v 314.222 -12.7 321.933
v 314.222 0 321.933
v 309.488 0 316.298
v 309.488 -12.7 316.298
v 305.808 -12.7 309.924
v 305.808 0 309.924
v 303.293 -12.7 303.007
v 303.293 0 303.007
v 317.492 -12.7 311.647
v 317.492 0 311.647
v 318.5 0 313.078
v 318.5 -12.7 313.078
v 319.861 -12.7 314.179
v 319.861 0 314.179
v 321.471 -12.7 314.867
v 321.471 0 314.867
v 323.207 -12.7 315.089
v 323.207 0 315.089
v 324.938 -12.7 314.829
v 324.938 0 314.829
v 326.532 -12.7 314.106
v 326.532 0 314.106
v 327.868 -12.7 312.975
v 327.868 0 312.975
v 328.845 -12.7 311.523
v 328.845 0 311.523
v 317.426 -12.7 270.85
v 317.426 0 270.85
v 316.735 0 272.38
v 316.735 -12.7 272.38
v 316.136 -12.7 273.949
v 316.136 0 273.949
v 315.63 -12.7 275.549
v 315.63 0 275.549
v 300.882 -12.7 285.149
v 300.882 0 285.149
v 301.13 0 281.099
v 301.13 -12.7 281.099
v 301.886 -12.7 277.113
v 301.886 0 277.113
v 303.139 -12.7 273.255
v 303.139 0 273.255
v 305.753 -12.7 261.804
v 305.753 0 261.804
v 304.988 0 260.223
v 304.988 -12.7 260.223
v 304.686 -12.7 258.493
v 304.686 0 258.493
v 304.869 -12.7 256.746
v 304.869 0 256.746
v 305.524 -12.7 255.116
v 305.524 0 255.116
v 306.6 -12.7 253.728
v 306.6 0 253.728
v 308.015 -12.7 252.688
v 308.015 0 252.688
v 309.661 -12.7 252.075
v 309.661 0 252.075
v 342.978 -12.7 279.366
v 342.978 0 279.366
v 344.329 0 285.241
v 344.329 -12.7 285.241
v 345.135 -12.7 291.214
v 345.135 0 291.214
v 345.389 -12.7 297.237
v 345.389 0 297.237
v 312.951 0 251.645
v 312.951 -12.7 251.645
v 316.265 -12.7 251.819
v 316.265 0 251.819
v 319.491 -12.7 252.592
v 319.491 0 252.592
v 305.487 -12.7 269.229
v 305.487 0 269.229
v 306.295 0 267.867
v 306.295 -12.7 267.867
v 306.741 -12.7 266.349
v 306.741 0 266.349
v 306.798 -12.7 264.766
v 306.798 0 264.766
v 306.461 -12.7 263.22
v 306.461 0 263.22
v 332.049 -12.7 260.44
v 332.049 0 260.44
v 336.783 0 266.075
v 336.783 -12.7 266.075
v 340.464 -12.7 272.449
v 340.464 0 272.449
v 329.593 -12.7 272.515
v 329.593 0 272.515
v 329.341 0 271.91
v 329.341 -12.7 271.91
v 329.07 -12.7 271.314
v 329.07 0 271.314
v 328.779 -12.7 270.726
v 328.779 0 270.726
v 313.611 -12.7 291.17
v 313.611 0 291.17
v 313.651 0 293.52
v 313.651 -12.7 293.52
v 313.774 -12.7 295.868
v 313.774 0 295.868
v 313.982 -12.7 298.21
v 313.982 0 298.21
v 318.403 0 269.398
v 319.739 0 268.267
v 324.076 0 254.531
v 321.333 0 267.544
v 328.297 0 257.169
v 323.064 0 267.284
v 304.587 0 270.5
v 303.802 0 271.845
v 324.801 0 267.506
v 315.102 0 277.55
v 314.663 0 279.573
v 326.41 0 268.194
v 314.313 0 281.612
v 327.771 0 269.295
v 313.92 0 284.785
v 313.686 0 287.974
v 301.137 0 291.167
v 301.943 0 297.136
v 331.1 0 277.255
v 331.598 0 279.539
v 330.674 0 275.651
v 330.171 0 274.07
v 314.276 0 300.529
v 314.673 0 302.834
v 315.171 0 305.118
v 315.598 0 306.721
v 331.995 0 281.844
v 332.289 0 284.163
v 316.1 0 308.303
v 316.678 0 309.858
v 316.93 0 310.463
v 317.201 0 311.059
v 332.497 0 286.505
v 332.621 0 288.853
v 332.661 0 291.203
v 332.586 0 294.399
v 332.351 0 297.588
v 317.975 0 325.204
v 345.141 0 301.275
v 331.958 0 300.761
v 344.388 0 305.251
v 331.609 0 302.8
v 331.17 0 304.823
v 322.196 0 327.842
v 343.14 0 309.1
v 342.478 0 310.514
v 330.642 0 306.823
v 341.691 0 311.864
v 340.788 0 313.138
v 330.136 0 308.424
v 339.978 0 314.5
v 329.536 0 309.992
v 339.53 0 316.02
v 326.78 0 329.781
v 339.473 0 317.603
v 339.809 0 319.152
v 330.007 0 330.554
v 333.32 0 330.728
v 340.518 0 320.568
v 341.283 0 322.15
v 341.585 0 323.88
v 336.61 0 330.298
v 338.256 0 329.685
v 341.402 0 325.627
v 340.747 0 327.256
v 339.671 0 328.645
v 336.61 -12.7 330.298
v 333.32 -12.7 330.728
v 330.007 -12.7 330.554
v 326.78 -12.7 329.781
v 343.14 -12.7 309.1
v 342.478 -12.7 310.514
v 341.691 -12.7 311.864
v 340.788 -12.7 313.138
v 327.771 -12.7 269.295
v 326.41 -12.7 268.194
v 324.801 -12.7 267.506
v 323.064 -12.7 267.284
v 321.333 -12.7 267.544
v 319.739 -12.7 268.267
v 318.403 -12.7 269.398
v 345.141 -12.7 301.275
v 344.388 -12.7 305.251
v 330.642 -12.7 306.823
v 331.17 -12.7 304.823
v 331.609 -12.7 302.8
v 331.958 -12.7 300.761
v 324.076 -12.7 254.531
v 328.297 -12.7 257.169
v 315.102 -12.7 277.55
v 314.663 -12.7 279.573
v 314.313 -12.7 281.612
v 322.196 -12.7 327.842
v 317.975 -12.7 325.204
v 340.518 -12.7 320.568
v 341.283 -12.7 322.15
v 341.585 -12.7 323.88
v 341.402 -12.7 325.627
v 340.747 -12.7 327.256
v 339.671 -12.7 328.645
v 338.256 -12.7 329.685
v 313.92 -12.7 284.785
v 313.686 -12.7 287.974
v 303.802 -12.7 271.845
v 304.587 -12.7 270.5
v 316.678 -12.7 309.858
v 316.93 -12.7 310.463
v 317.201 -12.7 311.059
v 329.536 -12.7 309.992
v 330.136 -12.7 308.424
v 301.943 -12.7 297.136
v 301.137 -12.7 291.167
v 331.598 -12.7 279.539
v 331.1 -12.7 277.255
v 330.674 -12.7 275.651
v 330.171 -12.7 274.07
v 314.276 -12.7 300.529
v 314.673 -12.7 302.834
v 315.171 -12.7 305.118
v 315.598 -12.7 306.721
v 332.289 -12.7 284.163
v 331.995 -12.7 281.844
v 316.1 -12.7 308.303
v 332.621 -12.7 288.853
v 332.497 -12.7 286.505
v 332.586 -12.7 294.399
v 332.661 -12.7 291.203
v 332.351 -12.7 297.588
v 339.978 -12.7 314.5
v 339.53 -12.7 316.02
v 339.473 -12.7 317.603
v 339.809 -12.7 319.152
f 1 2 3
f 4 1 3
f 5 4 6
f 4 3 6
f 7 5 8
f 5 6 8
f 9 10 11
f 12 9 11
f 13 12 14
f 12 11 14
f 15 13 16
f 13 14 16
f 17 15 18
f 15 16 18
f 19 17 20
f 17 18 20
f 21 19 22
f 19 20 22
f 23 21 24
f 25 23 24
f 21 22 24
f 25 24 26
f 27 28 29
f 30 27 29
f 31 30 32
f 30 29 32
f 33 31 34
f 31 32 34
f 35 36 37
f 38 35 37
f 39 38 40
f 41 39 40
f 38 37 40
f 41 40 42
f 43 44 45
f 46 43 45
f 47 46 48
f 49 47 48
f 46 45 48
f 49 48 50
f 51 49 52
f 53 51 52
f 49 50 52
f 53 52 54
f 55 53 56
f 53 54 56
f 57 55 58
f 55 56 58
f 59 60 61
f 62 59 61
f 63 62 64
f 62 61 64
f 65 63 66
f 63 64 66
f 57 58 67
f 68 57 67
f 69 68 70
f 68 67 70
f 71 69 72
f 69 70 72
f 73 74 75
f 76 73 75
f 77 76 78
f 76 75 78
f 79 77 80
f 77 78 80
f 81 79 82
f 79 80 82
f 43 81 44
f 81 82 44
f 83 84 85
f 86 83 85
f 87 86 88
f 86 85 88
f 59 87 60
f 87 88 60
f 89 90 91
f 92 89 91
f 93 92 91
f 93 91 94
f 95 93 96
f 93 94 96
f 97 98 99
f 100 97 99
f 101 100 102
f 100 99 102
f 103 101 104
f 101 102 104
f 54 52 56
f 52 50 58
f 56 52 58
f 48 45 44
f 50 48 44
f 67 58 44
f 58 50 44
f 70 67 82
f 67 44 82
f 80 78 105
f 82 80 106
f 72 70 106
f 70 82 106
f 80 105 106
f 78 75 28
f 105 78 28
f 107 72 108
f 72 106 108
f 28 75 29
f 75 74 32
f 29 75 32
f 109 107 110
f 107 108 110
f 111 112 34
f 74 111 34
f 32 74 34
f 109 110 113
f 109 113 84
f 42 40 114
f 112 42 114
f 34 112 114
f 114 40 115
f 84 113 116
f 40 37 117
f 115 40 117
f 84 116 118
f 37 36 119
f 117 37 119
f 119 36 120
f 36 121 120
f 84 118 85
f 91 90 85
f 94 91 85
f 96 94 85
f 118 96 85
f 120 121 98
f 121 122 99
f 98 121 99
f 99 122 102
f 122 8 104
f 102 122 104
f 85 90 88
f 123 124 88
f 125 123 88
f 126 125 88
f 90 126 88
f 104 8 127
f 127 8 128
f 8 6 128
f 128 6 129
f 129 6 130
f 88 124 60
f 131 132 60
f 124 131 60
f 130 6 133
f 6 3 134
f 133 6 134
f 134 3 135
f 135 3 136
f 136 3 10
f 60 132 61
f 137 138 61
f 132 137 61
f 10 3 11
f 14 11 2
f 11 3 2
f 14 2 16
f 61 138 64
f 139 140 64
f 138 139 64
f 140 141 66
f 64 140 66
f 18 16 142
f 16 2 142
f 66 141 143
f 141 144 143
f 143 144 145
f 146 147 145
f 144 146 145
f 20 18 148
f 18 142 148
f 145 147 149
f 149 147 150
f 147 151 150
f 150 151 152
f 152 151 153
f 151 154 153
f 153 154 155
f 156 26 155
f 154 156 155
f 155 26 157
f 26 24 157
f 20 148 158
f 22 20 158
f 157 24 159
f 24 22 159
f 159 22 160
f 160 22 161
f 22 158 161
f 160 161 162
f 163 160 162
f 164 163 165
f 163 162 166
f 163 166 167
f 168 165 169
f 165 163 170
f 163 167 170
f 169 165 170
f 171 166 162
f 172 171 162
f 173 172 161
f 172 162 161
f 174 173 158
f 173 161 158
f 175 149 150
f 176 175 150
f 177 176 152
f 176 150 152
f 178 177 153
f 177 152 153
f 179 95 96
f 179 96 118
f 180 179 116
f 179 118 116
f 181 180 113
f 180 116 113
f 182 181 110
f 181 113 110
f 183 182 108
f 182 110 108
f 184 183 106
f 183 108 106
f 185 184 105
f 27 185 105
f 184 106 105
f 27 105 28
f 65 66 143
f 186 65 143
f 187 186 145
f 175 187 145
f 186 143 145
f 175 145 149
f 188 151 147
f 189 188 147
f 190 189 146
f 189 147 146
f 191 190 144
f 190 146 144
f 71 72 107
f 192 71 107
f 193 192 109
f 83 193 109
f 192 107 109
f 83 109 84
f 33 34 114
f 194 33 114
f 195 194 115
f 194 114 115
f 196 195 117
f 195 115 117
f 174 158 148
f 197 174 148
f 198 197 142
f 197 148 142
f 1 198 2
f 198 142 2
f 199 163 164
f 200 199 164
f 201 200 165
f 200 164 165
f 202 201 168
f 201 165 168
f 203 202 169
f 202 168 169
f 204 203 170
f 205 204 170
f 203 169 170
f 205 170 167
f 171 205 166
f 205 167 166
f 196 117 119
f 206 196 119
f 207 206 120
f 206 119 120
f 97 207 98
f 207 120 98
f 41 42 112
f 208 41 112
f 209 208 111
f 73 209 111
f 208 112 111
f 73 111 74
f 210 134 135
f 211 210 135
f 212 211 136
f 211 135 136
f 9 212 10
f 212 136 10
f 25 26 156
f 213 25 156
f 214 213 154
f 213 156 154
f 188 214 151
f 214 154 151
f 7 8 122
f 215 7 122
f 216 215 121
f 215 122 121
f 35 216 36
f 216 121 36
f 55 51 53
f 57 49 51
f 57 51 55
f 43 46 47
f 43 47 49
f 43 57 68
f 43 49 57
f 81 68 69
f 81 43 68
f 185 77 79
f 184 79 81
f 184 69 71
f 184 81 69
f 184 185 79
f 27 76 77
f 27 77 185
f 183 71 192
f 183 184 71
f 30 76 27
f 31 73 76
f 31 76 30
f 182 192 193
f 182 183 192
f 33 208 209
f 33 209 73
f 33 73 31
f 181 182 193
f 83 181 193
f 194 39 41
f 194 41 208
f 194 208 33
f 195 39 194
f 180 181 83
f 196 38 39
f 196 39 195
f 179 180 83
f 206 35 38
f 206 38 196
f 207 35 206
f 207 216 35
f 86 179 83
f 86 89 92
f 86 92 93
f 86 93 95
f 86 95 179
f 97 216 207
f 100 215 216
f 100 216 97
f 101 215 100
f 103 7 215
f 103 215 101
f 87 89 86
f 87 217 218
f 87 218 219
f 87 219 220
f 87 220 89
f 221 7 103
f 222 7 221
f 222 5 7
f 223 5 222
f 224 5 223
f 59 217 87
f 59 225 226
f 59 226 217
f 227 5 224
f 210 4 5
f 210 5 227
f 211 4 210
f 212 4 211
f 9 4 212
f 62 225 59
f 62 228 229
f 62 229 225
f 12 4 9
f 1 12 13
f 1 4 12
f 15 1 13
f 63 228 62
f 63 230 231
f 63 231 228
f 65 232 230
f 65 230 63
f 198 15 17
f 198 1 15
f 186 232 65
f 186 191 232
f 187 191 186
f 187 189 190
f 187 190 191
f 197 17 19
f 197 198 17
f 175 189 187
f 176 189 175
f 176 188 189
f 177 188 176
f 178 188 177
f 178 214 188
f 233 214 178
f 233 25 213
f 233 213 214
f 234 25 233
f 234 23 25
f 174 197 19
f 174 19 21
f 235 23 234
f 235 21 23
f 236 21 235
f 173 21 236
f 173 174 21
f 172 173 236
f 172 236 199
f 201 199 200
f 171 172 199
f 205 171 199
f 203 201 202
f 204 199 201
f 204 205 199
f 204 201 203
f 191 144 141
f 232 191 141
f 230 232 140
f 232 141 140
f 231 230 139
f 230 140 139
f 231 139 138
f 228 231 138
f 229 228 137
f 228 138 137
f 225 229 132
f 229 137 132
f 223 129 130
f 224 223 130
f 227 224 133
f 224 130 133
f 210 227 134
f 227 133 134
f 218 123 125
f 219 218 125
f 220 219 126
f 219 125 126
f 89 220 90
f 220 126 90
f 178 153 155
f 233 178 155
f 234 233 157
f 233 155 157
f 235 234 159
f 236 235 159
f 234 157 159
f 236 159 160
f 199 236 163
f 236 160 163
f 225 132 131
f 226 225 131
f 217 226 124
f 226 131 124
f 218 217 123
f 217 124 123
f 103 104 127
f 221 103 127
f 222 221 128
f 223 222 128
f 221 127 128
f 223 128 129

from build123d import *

# Parameters (mm, degrees)
F1_DEPTH = 12.7


# Not quite as in the source:
# - ends of sketch curves that miss each other by under 0.0002 mm in the source are joined


with BuildPart() as f1:
    # F0 (on Front) → F1 (new body)
    with BuildSketch(Plane.XZ):
        with BuildLine():
            ThreePointArc((303.2931532121, 303.0067577098), (301.4715319233, 294.1610584771), (300.8818774244, 285.1490106185))
            ThreePointArc((300.8818774244, 285.1490106185), (301.4449295055, 279.0945065847), (303.1390906491, 273.2546565343))
            ThreePointArc((303.1390906491, 273.2546565343), (304.1794047627, 271.163745604), (305.4871188741, 269.2287914427))
            ThreePointArc((305.4871188741, 269.2287914427), (306.8191261994, 265.559271793), (305.752743748, 261.8039536514))
            ThreePointArc((305.752743748, 261.8039536514), (305.1400456304, 255.9083712227), (309.6612562028, 252.0753703346))
            ThreePointArc((309.6612562028, 252.0753703346), (314.6118369552, 251.6558987634), (319.4911798503, 252.5919579373))
            ThreePointArc((319.4911798503, 252.5919579373), (326.238452414, 255.7664937708), (332.0491509461, 260.4397327714))
            ThreePointArc((332.0491509461, 260.4397327714), (338.7629233679, 269.1816350422), (342.9782332171, 279.3662684747))
            ThreePointArc((342.9782332171, 279.3662684747), (344.8007217874, 288.2183656036), (345.3891604556, 297.2369467464))
            ThreePointArc((345.3891604556, 297.2369467464), (344.8270625572, 303.274887915), (343.1402655074, 309.0996131302))
            ThreePointArc((343.1402655074, 309.0996131302), (342.0995588503, 311.1979660981), (340.7875354527, 313.1382632658))
            ThreePointArc((340.7875354527, 313.1382632658), (339.4517460358, 316.8098548296), (340.5182976713, 320.568494544))
            ThreePointArc((340.5182976713, 320.568494544), (341.1313810425, 326.4642550769), (336.610094213, 330.2975007104))
            ThreePointArc((336.610094213, 330.2975007104), (331.659512348, 330.7170042507), (326.7801614181, 329.7809489664))
            ThreePointArc((326.7801614181, 329.7809489664), (320.0328916386, 326.6063773725), (314.2221892806, 321.9331298991))
            ThreePointArc((314.2221892806, 321.9331298991), (307.5084491355, 313.1913079367), (303.2931532121, 303.0067577098))
        make_face()
        with BuildLine():
            ThreePointArc((315.1713123146, 305.1180818659), (315.8393495072, 307.515035294), (316.678097317, 309.857717846))
            ThreePointArc((316.678097317, 309.857717846), (317.0633180741, 310.7621499557), (317.4920222134, 311.6467997261))
            ThreePointArc((317.4920222134, 311.6467997261), (323.2069159103, 315.0891849126), (328.8450890708, 311.5225170196))
            ThreePointArc((328.8450890708, 311.5225170196), (329.8473834441, 309.2127575845), (330.6417253346, 306.8234892773))
            ThreePointArc((330.6417253346, 306.8234892773), (331.4003540176, 303.8138045335), (331.9581118177, 300.7605072271))
            ThreePointArc((331.9581118177, 300.7605072271), (332.4883254582, 295.994995702), (332.6606828218, 291.2031767897))
            ThreePointArc((332.6606828218, 291.2031767897), (332.5693501994, 287.6782798164), (332.2892894077, 284.1633395865))
            ThreePointArc((332.2892894077, 284.1633395865), (331.8093085942, 280.6893291587), (331.1000077041, 277.2547960368))
            ThreePointArc((331.1000077041, 277.2547960368), (330.4319997673, 274.8578337912), (329.5932507917, 272.5151498081))
            ThreePointArc((329.5932507917, 272.5151498081), (329.2080362587, 271.6107324514), (328.7793397252, 270.7260967499))
            ThreePointArc((328.7793397252, 270.7260967499), (323.064427394, 267.2836913001), (317.4262371292, 270.8503593804))
            ThreePointArc((317.4262371292, 270.8503593804), (316.4239511956, 273.1601221417), (315.6296075412, 275.5493890189))
            ThreePointArc((315.6296075412, 275.5493890189), (314.8709725785, 278.5590700417), (314.3132149314, 281.612365479))
            ThreePointArc((314.3132149314, 281.612365479), (313.7830008793, 286.3778788276), (313.6106433782, 291.1696996103))
            ThreePointArc((313.6106433782, 291.1696996103), (313.7020014012, 294.6945965951), (313.9820621923, 298.2095368135))
            ThreePointArc((313.9820621923, 298.2095368135), (314.4620178297, 301.6835485419), (315.1713123146, 305.1180818659))
        make_face(mode=Mode.SUBTRACT)
    extrude(amount=F1_DEPTH)


solid = f1.part
